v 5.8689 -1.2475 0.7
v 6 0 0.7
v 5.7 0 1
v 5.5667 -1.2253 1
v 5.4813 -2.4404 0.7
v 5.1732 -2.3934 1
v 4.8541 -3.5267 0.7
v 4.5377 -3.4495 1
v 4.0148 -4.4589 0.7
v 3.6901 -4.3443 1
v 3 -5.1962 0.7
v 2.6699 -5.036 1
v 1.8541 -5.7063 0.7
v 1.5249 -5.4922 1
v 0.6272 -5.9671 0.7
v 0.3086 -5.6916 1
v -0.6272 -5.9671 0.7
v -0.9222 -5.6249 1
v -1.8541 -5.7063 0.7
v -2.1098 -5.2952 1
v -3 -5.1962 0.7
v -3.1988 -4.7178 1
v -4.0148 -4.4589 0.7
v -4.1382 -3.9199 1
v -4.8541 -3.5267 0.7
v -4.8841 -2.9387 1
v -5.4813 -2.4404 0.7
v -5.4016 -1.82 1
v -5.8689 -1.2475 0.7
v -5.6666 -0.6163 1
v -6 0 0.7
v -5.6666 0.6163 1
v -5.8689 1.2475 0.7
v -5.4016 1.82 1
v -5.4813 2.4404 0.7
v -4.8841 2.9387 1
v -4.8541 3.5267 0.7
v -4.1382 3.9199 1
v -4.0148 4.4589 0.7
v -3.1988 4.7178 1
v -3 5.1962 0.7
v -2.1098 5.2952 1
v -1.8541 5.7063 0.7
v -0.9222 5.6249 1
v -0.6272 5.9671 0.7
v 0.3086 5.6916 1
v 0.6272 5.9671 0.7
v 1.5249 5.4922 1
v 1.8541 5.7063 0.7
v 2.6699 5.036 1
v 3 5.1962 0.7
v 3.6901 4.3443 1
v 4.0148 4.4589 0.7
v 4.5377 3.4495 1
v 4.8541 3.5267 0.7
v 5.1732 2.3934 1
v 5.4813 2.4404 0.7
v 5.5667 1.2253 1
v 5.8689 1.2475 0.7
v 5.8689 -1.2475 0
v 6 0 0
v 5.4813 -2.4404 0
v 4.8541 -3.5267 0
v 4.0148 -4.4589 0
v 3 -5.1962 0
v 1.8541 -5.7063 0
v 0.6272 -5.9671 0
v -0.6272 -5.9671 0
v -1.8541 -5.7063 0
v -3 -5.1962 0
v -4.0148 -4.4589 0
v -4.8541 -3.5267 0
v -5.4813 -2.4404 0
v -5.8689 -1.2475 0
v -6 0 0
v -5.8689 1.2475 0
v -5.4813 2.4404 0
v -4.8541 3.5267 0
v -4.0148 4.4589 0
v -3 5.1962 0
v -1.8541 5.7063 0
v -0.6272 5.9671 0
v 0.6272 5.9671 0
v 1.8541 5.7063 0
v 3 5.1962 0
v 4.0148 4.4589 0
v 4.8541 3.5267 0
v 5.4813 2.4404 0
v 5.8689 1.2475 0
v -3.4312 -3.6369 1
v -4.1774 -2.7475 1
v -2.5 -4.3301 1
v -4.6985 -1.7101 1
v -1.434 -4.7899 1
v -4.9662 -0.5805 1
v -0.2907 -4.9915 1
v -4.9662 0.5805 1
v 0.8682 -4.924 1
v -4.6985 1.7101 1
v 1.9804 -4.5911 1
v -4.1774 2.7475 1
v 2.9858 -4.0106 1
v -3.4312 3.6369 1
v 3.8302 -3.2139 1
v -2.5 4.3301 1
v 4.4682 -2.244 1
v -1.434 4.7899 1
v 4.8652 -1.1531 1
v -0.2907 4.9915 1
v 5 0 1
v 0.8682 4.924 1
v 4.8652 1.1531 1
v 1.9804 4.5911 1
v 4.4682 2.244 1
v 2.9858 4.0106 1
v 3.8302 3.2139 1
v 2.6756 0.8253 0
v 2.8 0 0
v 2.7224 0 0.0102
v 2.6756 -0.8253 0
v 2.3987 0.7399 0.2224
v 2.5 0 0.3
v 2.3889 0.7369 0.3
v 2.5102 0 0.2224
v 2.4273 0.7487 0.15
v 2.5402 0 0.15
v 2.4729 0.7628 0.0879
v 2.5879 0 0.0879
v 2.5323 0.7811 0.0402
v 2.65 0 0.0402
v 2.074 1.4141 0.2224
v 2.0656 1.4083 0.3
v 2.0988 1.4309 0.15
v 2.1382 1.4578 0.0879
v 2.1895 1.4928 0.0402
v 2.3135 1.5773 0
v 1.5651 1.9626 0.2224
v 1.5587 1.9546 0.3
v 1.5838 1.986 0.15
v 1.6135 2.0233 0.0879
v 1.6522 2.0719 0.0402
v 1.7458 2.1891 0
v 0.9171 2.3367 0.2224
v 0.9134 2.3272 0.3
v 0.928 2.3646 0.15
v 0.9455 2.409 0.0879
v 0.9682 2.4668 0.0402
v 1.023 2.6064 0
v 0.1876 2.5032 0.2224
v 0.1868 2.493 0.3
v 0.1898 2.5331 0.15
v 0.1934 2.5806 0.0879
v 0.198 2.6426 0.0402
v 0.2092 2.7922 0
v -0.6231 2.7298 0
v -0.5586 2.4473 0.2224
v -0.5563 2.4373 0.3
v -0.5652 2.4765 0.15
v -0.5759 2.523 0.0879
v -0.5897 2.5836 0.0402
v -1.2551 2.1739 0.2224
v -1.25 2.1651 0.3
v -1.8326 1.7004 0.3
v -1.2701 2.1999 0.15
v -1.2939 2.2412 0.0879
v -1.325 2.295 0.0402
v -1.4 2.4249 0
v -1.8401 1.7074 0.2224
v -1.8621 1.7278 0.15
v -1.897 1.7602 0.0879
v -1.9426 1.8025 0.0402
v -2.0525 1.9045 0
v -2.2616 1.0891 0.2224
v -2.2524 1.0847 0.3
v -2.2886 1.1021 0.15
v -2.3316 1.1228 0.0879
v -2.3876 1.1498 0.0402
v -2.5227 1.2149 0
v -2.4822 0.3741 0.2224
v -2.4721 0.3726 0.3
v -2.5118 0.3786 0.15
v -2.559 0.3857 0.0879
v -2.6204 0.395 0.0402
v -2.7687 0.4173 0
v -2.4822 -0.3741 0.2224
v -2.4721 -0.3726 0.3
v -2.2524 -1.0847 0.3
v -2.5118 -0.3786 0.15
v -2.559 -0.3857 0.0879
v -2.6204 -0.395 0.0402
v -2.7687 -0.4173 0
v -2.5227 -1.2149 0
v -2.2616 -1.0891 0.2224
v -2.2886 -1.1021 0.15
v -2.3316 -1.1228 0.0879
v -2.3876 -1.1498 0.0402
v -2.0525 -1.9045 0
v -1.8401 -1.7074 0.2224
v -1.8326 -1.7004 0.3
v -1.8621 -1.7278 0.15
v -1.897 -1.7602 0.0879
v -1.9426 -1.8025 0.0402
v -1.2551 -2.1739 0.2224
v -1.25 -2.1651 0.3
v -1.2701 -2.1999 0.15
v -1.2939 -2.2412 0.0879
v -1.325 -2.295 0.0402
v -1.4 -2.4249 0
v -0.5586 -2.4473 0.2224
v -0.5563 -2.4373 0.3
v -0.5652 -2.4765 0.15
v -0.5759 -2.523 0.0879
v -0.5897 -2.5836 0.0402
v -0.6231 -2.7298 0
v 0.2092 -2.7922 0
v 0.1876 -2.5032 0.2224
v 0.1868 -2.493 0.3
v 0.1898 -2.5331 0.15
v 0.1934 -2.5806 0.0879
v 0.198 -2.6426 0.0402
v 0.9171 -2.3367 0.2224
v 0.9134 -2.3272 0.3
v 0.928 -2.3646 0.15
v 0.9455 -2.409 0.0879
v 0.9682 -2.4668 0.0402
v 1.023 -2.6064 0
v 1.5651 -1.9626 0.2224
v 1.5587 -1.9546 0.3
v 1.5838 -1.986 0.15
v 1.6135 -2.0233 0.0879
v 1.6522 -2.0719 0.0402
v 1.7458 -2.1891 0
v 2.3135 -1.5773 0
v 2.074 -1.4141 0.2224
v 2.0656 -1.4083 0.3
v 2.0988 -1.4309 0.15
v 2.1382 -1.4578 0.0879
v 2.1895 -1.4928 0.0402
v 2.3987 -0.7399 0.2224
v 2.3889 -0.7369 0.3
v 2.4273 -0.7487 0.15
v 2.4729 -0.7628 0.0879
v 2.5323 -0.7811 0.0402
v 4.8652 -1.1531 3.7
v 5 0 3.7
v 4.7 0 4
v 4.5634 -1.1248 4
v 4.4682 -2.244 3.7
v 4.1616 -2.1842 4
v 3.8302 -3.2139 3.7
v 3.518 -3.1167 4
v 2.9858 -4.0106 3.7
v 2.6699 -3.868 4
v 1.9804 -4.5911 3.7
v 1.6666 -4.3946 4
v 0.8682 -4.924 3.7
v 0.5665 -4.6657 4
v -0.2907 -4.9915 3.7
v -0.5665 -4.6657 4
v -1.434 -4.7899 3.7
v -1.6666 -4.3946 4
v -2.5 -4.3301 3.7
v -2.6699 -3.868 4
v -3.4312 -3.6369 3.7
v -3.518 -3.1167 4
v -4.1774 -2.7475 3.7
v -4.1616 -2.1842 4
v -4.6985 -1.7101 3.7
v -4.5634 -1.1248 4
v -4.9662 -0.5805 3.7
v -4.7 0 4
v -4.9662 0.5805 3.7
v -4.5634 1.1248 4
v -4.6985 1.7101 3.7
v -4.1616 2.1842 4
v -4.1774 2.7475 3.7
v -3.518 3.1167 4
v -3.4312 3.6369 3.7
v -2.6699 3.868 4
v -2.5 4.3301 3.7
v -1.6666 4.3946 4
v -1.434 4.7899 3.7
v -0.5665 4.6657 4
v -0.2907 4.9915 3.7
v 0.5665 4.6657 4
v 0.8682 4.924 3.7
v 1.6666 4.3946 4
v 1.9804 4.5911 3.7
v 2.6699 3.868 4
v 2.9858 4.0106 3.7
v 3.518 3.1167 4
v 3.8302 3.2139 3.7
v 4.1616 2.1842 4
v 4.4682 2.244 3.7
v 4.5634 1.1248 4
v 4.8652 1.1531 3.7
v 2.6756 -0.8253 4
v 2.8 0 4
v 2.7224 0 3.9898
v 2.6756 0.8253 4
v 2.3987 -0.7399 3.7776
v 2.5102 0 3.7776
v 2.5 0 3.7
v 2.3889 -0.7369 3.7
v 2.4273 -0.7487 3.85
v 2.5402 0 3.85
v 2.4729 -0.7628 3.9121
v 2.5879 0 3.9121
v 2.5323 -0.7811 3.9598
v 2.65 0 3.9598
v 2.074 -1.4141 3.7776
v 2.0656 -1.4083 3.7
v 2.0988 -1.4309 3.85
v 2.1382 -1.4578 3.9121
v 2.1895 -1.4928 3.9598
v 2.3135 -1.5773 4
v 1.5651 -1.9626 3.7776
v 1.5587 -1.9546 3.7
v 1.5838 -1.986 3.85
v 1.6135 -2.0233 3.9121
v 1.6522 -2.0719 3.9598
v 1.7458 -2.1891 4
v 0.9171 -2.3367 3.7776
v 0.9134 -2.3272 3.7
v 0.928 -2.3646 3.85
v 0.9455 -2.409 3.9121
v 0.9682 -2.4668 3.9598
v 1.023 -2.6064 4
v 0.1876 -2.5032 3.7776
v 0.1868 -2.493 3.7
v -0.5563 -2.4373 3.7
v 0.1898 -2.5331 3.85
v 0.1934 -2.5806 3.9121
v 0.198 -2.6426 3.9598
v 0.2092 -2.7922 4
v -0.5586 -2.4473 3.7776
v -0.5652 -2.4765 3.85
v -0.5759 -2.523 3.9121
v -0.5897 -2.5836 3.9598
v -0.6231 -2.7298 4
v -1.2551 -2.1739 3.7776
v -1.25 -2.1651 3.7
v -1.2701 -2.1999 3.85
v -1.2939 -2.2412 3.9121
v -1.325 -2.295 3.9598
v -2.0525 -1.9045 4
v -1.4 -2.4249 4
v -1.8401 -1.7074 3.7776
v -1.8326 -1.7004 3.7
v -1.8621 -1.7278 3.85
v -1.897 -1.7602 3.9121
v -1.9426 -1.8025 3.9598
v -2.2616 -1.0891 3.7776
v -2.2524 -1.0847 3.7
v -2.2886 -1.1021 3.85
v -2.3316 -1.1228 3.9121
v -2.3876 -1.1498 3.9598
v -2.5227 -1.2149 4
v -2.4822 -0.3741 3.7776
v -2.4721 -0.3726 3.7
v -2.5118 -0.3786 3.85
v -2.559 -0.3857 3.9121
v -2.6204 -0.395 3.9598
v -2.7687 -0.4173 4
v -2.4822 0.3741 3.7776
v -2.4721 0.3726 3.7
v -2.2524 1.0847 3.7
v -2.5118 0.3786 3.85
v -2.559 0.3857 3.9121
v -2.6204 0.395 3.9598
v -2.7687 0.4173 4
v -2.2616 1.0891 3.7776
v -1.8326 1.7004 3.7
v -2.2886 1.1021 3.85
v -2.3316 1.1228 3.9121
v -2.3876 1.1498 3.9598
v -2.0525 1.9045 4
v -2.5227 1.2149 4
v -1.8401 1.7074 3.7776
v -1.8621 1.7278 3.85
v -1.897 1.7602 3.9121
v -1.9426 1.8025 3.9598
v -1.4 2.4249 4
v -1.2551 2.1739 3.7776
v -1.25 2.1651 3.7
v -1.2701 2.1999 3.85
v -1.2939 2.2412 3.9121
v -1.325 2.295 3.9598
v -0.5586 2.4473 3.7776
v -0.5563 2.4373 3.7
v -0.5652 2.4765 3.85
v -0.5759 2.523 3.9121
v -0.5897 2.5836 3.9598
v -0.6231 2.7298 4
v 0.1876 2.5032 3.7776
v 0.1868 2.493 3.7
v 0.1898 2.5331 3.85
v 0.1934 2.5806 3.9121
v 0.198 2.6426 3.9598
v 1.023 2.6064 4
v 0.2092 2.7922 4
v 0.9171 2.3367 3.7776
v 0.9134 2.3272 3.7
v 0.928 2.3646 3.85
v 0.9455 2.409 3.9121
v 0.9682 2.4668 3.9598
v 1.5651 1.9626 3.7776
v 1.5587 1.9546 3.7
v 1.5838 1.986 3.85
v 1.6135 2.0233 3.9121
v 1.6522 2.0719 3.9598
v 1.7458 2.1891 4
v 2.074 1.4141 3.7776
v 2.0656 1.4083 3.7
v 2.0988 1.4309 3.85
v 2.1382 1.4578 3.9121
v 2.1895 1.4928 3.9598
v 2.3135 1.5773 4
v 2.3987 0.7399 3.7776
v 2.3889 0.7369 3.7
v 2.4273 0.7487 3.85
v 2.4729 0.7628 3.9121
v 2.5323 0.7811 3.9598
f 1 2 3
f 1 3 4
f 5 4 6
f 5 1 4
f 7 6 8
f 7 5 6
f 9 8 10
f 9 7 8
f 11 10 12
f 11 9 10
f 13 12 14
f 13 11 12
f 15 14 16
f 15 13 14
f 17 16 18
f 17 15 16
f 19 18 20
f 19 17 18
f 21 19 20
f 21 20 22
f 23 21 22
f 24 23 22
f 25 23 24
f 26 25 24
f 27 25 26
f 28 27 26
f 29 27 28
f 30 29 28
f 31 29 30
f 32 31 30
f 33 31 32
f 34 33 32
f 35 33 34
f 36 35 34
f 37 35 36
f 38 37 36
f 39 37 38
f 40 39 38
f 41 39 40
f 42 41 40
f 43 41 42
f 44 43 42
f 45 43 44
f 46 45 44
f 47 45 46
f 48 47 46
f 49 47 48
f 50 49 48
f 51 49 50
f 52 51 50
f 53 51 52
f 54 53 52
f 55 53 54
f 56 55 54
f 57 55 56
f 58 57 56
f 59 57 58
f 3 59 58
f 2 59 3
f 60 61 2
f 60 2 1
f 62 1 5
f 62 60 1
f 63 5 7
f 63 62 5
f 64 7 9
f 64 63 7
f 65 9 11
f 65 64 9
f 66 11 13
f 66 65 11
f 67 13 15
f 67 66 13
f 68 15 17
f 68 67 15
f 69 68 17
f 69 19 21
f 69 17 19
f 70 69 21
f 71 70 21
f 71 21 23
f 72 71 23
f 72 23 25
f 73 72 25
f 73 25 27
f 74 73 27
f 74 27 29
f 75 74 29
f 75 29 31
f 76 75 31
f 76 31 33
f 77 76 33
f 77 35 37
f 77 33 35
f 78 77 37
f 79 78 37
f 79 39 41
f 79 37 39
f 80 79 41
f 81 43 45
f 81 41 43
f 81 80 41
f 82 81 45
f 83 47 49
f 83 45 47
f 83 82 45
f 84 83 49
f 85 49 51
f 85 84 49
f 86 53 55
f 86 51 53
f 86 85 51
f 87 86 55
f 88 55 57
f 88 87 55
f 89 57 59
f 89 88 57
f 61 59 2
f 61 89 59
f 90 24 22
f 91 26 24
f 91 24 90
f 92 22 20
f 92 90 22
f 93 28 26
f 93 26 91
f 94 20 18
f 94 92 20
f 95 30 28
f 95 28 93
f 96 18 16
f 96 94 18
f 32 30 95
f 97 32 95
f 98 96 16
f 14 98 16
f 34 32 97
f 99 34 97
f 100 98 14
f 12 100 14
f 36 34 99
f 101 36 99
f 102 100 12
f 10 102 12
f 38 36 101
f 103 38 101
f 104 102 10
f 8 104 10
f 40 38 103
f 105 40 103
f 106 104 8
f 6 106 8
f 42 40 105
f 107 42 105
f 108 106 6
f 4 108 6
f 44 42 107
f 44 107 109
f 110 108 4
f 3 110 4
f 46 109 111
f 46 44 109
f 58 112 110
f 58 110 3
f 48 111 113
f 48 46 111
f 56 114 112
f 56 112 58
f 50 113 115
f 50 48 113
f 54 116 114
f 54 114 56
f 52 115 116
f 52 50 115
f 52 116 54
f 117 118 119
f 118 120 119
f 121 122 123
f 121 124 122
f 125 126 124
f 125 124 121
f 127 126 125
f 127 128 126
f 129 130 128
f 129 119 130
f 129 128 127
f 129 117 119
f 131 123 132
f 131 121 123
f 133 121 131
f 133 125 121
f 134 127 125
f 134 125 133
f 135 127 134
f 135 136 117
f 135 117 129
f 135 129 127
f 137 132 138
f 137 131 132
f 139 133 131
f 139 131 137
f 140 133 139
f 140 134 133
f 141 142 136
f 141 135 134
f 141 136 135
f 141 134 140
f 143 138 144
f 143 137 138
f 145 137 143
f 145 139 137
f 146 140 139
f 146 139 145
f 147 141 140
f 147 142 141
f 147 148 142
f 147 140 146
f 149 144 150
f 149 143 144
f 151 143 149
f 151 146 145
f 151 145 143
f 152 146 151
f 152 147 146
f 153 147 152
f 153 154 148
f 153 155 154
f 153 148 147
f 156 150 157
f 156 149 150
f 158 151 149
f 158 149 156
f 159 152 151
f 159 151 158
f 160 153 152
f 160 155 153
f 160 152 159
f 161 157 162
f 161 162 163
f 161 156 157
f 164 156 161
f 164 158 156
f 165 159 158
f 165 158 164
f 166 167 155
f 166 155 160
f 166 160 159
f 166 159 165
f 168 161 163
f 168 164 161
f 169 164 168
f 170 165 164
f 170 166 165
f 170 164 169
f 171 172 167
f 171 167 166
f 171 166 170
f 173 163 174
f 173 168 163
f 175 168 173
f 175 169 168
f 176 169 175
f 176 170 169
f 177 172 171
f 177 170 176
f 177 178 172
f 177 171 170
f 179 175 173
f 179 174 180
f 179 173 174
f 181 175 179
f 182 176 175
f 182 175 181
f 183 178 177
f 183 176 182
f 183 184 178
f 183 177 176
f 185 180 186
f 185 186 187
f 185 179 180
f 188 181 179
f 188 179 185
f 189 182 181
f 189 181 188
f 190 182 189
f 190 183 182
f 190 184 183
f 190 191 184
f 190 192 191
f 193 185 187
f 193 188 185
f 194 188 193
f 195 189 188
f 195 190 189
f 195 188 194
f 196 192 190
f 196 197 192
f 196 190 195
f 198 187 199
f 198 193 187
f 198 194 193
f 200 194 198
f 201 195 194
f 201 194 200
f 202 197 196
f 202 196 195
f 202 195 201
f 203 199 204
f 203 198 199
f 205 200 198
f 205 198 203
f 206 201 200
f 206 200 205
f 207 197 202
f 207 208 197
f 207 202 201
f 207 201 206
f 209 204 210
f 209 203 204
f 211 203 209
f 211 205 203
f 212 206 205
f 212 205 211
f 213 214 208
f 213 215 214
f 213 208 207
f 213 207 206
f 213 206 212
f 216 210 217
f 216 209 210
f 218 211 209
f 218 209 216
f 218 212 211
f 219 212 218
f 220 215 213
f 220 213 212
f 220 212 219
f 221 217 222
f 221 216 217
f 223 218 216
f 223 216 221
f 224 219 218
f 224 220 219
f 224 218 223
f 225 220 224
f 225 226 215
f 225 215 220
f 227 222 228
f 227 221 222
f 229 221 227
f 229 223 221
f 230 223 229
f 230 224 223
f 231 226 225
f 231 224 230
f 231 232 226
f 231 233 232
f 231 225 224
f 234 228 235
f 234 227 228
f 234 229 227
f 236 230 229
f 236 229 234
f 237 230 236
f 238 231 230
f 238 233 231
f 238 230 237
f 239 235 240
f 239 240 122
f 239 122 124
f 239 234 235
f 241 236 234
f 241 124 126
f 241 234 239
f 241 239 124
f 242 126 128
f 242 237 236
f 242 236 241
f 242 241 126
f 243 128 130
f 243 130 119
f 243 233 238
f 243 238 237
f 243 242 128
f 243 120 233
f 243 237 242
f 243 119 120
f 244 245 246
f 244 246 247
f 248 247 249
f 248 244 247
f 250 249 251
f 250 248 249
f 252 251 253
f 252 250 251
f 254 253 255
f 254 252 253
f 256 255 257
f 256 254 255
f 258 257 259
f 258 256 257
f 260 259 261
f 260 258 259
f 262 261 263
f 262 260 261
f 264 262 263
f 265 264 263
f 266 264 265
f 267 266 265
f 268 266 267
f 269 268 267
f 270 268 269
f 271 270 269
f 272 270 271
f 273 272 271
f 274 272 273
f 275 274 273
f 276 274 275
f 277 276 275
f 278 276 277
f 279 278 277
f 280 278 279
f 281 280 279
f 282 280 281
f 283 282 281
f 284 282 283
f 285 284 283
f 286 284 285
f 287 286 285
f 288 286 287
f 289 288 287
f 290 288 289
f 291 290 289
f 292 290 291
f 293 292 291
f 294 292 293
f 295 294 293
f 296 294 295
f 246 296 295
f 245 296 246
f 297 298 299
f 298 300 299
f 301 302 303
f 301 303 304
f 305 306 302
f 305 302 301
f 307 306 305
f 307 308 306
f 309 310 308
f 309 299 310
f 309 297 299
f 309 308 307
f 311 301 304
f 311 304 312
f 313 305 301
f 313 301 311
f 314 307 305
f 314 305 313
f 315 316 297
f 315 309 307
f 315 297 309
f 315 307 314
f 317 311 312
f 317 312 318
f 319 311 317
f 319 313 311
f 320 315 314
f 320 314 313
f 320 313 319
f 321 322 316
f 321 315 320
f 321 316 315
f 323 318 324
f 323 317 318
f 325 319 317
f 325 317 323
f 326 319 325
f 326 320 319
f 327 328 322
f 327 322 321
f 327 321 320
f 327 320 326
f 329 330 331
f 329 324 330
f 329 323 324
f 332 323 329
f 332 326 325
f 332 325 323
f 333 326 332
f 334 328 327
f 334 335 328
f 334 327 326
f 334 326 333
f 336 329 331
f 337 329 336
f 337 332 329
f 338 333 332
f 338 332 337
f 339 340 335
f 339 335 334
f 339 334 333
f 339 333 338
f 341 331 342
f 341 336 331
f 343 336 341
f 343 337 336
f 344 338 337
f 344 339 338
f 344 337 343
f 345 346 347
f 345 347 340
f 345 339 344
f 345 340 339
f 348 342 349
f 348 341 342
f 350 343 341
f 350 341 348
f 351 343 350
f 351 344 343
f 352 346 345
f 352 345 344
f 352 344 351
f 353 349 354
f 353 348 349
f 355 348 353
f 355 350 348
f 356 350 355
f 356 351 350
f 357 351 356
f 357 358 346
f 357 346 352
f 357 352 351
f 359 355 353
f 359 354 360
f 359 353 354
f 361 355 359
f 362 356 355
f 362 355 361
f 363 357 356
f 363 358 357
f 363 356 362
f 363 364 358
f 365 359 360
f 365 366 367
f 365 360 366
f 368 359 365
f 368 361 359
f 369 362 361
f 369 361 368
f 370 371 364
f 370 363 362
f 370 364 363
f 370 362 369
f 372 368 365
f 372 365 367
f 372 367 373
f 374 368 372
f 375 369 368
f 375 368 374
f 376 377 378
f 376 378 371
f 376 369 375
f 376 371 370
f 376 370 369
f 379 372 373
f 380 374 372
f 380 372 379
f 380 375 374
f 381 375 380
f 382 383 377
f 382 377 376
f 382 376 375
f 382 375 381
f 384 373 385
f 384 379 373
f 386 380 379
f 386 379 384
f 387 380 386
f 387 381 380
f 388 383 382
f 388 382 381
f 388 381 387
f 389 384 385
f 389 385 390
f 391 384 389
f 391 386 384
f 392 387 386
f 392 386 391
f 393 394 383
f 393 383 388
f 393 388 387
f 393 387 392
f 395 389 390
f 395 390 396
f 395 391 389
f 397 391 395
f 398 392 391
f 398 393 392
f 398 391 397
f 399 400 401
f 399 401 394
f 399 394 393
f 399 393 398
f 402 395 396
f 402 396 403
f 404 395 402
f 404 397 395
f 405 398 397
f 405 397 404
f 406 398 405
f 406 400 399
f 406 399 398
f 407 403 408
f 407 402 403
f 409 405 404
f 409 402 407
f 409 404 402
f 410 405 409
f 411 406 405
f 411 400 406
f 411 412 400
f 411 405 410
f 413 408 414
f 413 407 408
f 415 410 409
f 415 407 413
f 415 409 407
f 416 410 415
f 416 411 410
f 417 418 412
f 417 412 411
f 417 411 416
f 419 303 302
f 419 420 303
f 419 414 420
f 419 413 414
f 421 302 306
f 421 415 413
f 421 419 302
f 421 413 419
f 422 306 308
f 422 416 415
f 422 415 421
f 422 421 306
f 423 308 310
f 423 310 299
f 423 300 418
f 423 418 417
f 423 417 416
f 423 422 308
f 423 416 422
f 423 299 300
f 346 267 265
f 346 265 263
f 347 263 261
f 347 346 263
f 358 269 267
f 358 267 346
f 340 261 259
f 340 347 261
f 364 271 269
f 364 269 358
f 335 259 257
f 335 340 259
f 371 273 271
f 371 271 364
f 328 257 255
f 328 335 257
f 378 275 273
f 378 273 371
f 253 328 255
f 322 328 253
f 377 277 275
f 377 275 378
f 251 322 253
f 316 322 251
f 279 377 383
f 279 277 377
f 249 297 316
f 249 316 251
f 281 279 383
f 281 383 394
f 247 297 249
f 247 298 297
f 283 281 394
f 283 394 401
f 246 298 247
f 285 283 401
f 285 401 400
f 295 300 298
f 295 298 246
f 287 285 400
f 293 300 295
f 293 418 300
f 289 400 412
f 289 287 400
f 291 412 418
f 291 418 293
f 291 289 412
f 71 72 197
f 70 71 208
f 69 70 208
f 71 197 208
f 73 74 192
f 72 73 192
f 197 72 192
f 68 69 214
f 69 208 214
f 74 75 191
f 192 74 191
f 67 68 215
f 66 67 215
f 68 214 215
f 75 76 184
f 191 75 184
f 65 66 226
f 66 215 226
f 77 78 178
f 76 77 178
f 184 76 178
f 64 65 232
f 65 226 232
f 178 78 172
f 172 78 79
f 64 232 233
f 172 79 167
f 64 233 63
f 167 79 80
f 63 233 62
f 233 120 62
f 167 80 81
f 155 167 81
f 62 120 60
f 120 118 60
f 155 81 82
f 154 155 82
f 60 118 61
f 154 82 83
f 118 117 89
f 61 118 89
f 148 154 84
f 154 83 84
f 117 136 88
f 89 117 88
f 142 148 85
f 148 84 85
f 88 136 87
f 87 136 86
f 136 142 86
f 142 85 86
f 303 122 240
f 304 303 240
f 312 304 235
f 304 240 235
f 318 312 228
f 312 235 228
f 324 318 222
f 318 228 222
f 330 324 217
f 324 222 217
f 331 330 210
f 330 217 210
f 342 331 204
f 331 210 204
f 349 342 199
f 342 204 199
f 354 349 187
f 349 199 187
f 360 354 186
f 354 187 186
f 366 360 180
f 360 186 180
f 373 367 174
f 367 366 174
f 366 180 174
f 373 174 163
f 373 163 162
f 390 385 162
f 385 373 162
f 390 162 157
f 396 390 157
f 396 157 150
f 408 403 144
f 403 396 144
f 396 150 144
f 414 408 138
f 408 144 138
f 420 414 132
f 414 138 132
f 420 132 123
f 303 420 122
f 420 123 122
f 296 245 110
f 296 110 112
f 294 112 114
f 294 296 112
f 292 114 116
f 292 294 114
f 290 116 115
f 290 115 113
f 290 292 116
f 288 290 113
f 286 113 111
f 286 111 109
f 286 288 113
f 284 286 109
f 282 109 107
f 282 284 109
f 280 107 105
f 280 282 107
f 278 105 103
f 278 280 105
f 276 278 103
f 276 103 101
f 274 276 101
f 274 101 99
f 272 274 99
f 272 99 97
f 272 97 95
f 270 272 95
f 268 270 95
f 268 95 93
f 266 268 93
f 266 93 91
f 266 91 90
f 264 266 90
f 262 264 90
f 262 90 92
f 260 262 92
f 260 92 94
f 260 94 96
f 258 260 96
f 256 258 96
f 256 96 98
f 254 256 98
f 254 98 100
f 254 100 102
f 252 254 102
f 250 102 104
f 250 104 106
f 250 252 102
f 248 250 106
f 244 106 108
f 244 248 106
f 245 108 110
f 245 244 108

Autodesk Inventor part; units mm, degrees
ref_plane "YZ Plane" through (0, 0, 0) normal (1, 0, 0) x (0, 1, 0)
ref_plane "XZ Plane" through (0, 0, 0) normal (0, 1, 0) x (-1, 0, 0)
ref_plane "XY Plane" through (0, 0, 0) normal (0, 0, 1) x (1, 0, 0)
sketch "Boceto1" plane through (0, 0, 0) normal (0, 0, 1) x (1, 0, 0)
  circle A0 centre (0, 0) radius 6
  circle A1 centre (0, 0) radius 2.5
extrude "Extrusión1" add sketch "Boceto1" along normal blind 4
sketch "Boceto2" plane through (0, 0, 4) normal (0, 0, 1) x (1, 0, 0)
  circle A0 centre (0, 0) radius 6 projected
  circle A1 centre (0, 0) radius 5
fillet "Empalme1" radius 0.3 2 edges at (-2.5, 0, 4) (-2.5, 0, 0)
extrude "Extrusión3" cut sketch "Boceto2" against normal blind 3
chamfer "Chaflán2" distance 0.3 angle 45 2 edges at (-5, 0, 4) (-6, 0, 1)
properties part number "cojinete polea x"
